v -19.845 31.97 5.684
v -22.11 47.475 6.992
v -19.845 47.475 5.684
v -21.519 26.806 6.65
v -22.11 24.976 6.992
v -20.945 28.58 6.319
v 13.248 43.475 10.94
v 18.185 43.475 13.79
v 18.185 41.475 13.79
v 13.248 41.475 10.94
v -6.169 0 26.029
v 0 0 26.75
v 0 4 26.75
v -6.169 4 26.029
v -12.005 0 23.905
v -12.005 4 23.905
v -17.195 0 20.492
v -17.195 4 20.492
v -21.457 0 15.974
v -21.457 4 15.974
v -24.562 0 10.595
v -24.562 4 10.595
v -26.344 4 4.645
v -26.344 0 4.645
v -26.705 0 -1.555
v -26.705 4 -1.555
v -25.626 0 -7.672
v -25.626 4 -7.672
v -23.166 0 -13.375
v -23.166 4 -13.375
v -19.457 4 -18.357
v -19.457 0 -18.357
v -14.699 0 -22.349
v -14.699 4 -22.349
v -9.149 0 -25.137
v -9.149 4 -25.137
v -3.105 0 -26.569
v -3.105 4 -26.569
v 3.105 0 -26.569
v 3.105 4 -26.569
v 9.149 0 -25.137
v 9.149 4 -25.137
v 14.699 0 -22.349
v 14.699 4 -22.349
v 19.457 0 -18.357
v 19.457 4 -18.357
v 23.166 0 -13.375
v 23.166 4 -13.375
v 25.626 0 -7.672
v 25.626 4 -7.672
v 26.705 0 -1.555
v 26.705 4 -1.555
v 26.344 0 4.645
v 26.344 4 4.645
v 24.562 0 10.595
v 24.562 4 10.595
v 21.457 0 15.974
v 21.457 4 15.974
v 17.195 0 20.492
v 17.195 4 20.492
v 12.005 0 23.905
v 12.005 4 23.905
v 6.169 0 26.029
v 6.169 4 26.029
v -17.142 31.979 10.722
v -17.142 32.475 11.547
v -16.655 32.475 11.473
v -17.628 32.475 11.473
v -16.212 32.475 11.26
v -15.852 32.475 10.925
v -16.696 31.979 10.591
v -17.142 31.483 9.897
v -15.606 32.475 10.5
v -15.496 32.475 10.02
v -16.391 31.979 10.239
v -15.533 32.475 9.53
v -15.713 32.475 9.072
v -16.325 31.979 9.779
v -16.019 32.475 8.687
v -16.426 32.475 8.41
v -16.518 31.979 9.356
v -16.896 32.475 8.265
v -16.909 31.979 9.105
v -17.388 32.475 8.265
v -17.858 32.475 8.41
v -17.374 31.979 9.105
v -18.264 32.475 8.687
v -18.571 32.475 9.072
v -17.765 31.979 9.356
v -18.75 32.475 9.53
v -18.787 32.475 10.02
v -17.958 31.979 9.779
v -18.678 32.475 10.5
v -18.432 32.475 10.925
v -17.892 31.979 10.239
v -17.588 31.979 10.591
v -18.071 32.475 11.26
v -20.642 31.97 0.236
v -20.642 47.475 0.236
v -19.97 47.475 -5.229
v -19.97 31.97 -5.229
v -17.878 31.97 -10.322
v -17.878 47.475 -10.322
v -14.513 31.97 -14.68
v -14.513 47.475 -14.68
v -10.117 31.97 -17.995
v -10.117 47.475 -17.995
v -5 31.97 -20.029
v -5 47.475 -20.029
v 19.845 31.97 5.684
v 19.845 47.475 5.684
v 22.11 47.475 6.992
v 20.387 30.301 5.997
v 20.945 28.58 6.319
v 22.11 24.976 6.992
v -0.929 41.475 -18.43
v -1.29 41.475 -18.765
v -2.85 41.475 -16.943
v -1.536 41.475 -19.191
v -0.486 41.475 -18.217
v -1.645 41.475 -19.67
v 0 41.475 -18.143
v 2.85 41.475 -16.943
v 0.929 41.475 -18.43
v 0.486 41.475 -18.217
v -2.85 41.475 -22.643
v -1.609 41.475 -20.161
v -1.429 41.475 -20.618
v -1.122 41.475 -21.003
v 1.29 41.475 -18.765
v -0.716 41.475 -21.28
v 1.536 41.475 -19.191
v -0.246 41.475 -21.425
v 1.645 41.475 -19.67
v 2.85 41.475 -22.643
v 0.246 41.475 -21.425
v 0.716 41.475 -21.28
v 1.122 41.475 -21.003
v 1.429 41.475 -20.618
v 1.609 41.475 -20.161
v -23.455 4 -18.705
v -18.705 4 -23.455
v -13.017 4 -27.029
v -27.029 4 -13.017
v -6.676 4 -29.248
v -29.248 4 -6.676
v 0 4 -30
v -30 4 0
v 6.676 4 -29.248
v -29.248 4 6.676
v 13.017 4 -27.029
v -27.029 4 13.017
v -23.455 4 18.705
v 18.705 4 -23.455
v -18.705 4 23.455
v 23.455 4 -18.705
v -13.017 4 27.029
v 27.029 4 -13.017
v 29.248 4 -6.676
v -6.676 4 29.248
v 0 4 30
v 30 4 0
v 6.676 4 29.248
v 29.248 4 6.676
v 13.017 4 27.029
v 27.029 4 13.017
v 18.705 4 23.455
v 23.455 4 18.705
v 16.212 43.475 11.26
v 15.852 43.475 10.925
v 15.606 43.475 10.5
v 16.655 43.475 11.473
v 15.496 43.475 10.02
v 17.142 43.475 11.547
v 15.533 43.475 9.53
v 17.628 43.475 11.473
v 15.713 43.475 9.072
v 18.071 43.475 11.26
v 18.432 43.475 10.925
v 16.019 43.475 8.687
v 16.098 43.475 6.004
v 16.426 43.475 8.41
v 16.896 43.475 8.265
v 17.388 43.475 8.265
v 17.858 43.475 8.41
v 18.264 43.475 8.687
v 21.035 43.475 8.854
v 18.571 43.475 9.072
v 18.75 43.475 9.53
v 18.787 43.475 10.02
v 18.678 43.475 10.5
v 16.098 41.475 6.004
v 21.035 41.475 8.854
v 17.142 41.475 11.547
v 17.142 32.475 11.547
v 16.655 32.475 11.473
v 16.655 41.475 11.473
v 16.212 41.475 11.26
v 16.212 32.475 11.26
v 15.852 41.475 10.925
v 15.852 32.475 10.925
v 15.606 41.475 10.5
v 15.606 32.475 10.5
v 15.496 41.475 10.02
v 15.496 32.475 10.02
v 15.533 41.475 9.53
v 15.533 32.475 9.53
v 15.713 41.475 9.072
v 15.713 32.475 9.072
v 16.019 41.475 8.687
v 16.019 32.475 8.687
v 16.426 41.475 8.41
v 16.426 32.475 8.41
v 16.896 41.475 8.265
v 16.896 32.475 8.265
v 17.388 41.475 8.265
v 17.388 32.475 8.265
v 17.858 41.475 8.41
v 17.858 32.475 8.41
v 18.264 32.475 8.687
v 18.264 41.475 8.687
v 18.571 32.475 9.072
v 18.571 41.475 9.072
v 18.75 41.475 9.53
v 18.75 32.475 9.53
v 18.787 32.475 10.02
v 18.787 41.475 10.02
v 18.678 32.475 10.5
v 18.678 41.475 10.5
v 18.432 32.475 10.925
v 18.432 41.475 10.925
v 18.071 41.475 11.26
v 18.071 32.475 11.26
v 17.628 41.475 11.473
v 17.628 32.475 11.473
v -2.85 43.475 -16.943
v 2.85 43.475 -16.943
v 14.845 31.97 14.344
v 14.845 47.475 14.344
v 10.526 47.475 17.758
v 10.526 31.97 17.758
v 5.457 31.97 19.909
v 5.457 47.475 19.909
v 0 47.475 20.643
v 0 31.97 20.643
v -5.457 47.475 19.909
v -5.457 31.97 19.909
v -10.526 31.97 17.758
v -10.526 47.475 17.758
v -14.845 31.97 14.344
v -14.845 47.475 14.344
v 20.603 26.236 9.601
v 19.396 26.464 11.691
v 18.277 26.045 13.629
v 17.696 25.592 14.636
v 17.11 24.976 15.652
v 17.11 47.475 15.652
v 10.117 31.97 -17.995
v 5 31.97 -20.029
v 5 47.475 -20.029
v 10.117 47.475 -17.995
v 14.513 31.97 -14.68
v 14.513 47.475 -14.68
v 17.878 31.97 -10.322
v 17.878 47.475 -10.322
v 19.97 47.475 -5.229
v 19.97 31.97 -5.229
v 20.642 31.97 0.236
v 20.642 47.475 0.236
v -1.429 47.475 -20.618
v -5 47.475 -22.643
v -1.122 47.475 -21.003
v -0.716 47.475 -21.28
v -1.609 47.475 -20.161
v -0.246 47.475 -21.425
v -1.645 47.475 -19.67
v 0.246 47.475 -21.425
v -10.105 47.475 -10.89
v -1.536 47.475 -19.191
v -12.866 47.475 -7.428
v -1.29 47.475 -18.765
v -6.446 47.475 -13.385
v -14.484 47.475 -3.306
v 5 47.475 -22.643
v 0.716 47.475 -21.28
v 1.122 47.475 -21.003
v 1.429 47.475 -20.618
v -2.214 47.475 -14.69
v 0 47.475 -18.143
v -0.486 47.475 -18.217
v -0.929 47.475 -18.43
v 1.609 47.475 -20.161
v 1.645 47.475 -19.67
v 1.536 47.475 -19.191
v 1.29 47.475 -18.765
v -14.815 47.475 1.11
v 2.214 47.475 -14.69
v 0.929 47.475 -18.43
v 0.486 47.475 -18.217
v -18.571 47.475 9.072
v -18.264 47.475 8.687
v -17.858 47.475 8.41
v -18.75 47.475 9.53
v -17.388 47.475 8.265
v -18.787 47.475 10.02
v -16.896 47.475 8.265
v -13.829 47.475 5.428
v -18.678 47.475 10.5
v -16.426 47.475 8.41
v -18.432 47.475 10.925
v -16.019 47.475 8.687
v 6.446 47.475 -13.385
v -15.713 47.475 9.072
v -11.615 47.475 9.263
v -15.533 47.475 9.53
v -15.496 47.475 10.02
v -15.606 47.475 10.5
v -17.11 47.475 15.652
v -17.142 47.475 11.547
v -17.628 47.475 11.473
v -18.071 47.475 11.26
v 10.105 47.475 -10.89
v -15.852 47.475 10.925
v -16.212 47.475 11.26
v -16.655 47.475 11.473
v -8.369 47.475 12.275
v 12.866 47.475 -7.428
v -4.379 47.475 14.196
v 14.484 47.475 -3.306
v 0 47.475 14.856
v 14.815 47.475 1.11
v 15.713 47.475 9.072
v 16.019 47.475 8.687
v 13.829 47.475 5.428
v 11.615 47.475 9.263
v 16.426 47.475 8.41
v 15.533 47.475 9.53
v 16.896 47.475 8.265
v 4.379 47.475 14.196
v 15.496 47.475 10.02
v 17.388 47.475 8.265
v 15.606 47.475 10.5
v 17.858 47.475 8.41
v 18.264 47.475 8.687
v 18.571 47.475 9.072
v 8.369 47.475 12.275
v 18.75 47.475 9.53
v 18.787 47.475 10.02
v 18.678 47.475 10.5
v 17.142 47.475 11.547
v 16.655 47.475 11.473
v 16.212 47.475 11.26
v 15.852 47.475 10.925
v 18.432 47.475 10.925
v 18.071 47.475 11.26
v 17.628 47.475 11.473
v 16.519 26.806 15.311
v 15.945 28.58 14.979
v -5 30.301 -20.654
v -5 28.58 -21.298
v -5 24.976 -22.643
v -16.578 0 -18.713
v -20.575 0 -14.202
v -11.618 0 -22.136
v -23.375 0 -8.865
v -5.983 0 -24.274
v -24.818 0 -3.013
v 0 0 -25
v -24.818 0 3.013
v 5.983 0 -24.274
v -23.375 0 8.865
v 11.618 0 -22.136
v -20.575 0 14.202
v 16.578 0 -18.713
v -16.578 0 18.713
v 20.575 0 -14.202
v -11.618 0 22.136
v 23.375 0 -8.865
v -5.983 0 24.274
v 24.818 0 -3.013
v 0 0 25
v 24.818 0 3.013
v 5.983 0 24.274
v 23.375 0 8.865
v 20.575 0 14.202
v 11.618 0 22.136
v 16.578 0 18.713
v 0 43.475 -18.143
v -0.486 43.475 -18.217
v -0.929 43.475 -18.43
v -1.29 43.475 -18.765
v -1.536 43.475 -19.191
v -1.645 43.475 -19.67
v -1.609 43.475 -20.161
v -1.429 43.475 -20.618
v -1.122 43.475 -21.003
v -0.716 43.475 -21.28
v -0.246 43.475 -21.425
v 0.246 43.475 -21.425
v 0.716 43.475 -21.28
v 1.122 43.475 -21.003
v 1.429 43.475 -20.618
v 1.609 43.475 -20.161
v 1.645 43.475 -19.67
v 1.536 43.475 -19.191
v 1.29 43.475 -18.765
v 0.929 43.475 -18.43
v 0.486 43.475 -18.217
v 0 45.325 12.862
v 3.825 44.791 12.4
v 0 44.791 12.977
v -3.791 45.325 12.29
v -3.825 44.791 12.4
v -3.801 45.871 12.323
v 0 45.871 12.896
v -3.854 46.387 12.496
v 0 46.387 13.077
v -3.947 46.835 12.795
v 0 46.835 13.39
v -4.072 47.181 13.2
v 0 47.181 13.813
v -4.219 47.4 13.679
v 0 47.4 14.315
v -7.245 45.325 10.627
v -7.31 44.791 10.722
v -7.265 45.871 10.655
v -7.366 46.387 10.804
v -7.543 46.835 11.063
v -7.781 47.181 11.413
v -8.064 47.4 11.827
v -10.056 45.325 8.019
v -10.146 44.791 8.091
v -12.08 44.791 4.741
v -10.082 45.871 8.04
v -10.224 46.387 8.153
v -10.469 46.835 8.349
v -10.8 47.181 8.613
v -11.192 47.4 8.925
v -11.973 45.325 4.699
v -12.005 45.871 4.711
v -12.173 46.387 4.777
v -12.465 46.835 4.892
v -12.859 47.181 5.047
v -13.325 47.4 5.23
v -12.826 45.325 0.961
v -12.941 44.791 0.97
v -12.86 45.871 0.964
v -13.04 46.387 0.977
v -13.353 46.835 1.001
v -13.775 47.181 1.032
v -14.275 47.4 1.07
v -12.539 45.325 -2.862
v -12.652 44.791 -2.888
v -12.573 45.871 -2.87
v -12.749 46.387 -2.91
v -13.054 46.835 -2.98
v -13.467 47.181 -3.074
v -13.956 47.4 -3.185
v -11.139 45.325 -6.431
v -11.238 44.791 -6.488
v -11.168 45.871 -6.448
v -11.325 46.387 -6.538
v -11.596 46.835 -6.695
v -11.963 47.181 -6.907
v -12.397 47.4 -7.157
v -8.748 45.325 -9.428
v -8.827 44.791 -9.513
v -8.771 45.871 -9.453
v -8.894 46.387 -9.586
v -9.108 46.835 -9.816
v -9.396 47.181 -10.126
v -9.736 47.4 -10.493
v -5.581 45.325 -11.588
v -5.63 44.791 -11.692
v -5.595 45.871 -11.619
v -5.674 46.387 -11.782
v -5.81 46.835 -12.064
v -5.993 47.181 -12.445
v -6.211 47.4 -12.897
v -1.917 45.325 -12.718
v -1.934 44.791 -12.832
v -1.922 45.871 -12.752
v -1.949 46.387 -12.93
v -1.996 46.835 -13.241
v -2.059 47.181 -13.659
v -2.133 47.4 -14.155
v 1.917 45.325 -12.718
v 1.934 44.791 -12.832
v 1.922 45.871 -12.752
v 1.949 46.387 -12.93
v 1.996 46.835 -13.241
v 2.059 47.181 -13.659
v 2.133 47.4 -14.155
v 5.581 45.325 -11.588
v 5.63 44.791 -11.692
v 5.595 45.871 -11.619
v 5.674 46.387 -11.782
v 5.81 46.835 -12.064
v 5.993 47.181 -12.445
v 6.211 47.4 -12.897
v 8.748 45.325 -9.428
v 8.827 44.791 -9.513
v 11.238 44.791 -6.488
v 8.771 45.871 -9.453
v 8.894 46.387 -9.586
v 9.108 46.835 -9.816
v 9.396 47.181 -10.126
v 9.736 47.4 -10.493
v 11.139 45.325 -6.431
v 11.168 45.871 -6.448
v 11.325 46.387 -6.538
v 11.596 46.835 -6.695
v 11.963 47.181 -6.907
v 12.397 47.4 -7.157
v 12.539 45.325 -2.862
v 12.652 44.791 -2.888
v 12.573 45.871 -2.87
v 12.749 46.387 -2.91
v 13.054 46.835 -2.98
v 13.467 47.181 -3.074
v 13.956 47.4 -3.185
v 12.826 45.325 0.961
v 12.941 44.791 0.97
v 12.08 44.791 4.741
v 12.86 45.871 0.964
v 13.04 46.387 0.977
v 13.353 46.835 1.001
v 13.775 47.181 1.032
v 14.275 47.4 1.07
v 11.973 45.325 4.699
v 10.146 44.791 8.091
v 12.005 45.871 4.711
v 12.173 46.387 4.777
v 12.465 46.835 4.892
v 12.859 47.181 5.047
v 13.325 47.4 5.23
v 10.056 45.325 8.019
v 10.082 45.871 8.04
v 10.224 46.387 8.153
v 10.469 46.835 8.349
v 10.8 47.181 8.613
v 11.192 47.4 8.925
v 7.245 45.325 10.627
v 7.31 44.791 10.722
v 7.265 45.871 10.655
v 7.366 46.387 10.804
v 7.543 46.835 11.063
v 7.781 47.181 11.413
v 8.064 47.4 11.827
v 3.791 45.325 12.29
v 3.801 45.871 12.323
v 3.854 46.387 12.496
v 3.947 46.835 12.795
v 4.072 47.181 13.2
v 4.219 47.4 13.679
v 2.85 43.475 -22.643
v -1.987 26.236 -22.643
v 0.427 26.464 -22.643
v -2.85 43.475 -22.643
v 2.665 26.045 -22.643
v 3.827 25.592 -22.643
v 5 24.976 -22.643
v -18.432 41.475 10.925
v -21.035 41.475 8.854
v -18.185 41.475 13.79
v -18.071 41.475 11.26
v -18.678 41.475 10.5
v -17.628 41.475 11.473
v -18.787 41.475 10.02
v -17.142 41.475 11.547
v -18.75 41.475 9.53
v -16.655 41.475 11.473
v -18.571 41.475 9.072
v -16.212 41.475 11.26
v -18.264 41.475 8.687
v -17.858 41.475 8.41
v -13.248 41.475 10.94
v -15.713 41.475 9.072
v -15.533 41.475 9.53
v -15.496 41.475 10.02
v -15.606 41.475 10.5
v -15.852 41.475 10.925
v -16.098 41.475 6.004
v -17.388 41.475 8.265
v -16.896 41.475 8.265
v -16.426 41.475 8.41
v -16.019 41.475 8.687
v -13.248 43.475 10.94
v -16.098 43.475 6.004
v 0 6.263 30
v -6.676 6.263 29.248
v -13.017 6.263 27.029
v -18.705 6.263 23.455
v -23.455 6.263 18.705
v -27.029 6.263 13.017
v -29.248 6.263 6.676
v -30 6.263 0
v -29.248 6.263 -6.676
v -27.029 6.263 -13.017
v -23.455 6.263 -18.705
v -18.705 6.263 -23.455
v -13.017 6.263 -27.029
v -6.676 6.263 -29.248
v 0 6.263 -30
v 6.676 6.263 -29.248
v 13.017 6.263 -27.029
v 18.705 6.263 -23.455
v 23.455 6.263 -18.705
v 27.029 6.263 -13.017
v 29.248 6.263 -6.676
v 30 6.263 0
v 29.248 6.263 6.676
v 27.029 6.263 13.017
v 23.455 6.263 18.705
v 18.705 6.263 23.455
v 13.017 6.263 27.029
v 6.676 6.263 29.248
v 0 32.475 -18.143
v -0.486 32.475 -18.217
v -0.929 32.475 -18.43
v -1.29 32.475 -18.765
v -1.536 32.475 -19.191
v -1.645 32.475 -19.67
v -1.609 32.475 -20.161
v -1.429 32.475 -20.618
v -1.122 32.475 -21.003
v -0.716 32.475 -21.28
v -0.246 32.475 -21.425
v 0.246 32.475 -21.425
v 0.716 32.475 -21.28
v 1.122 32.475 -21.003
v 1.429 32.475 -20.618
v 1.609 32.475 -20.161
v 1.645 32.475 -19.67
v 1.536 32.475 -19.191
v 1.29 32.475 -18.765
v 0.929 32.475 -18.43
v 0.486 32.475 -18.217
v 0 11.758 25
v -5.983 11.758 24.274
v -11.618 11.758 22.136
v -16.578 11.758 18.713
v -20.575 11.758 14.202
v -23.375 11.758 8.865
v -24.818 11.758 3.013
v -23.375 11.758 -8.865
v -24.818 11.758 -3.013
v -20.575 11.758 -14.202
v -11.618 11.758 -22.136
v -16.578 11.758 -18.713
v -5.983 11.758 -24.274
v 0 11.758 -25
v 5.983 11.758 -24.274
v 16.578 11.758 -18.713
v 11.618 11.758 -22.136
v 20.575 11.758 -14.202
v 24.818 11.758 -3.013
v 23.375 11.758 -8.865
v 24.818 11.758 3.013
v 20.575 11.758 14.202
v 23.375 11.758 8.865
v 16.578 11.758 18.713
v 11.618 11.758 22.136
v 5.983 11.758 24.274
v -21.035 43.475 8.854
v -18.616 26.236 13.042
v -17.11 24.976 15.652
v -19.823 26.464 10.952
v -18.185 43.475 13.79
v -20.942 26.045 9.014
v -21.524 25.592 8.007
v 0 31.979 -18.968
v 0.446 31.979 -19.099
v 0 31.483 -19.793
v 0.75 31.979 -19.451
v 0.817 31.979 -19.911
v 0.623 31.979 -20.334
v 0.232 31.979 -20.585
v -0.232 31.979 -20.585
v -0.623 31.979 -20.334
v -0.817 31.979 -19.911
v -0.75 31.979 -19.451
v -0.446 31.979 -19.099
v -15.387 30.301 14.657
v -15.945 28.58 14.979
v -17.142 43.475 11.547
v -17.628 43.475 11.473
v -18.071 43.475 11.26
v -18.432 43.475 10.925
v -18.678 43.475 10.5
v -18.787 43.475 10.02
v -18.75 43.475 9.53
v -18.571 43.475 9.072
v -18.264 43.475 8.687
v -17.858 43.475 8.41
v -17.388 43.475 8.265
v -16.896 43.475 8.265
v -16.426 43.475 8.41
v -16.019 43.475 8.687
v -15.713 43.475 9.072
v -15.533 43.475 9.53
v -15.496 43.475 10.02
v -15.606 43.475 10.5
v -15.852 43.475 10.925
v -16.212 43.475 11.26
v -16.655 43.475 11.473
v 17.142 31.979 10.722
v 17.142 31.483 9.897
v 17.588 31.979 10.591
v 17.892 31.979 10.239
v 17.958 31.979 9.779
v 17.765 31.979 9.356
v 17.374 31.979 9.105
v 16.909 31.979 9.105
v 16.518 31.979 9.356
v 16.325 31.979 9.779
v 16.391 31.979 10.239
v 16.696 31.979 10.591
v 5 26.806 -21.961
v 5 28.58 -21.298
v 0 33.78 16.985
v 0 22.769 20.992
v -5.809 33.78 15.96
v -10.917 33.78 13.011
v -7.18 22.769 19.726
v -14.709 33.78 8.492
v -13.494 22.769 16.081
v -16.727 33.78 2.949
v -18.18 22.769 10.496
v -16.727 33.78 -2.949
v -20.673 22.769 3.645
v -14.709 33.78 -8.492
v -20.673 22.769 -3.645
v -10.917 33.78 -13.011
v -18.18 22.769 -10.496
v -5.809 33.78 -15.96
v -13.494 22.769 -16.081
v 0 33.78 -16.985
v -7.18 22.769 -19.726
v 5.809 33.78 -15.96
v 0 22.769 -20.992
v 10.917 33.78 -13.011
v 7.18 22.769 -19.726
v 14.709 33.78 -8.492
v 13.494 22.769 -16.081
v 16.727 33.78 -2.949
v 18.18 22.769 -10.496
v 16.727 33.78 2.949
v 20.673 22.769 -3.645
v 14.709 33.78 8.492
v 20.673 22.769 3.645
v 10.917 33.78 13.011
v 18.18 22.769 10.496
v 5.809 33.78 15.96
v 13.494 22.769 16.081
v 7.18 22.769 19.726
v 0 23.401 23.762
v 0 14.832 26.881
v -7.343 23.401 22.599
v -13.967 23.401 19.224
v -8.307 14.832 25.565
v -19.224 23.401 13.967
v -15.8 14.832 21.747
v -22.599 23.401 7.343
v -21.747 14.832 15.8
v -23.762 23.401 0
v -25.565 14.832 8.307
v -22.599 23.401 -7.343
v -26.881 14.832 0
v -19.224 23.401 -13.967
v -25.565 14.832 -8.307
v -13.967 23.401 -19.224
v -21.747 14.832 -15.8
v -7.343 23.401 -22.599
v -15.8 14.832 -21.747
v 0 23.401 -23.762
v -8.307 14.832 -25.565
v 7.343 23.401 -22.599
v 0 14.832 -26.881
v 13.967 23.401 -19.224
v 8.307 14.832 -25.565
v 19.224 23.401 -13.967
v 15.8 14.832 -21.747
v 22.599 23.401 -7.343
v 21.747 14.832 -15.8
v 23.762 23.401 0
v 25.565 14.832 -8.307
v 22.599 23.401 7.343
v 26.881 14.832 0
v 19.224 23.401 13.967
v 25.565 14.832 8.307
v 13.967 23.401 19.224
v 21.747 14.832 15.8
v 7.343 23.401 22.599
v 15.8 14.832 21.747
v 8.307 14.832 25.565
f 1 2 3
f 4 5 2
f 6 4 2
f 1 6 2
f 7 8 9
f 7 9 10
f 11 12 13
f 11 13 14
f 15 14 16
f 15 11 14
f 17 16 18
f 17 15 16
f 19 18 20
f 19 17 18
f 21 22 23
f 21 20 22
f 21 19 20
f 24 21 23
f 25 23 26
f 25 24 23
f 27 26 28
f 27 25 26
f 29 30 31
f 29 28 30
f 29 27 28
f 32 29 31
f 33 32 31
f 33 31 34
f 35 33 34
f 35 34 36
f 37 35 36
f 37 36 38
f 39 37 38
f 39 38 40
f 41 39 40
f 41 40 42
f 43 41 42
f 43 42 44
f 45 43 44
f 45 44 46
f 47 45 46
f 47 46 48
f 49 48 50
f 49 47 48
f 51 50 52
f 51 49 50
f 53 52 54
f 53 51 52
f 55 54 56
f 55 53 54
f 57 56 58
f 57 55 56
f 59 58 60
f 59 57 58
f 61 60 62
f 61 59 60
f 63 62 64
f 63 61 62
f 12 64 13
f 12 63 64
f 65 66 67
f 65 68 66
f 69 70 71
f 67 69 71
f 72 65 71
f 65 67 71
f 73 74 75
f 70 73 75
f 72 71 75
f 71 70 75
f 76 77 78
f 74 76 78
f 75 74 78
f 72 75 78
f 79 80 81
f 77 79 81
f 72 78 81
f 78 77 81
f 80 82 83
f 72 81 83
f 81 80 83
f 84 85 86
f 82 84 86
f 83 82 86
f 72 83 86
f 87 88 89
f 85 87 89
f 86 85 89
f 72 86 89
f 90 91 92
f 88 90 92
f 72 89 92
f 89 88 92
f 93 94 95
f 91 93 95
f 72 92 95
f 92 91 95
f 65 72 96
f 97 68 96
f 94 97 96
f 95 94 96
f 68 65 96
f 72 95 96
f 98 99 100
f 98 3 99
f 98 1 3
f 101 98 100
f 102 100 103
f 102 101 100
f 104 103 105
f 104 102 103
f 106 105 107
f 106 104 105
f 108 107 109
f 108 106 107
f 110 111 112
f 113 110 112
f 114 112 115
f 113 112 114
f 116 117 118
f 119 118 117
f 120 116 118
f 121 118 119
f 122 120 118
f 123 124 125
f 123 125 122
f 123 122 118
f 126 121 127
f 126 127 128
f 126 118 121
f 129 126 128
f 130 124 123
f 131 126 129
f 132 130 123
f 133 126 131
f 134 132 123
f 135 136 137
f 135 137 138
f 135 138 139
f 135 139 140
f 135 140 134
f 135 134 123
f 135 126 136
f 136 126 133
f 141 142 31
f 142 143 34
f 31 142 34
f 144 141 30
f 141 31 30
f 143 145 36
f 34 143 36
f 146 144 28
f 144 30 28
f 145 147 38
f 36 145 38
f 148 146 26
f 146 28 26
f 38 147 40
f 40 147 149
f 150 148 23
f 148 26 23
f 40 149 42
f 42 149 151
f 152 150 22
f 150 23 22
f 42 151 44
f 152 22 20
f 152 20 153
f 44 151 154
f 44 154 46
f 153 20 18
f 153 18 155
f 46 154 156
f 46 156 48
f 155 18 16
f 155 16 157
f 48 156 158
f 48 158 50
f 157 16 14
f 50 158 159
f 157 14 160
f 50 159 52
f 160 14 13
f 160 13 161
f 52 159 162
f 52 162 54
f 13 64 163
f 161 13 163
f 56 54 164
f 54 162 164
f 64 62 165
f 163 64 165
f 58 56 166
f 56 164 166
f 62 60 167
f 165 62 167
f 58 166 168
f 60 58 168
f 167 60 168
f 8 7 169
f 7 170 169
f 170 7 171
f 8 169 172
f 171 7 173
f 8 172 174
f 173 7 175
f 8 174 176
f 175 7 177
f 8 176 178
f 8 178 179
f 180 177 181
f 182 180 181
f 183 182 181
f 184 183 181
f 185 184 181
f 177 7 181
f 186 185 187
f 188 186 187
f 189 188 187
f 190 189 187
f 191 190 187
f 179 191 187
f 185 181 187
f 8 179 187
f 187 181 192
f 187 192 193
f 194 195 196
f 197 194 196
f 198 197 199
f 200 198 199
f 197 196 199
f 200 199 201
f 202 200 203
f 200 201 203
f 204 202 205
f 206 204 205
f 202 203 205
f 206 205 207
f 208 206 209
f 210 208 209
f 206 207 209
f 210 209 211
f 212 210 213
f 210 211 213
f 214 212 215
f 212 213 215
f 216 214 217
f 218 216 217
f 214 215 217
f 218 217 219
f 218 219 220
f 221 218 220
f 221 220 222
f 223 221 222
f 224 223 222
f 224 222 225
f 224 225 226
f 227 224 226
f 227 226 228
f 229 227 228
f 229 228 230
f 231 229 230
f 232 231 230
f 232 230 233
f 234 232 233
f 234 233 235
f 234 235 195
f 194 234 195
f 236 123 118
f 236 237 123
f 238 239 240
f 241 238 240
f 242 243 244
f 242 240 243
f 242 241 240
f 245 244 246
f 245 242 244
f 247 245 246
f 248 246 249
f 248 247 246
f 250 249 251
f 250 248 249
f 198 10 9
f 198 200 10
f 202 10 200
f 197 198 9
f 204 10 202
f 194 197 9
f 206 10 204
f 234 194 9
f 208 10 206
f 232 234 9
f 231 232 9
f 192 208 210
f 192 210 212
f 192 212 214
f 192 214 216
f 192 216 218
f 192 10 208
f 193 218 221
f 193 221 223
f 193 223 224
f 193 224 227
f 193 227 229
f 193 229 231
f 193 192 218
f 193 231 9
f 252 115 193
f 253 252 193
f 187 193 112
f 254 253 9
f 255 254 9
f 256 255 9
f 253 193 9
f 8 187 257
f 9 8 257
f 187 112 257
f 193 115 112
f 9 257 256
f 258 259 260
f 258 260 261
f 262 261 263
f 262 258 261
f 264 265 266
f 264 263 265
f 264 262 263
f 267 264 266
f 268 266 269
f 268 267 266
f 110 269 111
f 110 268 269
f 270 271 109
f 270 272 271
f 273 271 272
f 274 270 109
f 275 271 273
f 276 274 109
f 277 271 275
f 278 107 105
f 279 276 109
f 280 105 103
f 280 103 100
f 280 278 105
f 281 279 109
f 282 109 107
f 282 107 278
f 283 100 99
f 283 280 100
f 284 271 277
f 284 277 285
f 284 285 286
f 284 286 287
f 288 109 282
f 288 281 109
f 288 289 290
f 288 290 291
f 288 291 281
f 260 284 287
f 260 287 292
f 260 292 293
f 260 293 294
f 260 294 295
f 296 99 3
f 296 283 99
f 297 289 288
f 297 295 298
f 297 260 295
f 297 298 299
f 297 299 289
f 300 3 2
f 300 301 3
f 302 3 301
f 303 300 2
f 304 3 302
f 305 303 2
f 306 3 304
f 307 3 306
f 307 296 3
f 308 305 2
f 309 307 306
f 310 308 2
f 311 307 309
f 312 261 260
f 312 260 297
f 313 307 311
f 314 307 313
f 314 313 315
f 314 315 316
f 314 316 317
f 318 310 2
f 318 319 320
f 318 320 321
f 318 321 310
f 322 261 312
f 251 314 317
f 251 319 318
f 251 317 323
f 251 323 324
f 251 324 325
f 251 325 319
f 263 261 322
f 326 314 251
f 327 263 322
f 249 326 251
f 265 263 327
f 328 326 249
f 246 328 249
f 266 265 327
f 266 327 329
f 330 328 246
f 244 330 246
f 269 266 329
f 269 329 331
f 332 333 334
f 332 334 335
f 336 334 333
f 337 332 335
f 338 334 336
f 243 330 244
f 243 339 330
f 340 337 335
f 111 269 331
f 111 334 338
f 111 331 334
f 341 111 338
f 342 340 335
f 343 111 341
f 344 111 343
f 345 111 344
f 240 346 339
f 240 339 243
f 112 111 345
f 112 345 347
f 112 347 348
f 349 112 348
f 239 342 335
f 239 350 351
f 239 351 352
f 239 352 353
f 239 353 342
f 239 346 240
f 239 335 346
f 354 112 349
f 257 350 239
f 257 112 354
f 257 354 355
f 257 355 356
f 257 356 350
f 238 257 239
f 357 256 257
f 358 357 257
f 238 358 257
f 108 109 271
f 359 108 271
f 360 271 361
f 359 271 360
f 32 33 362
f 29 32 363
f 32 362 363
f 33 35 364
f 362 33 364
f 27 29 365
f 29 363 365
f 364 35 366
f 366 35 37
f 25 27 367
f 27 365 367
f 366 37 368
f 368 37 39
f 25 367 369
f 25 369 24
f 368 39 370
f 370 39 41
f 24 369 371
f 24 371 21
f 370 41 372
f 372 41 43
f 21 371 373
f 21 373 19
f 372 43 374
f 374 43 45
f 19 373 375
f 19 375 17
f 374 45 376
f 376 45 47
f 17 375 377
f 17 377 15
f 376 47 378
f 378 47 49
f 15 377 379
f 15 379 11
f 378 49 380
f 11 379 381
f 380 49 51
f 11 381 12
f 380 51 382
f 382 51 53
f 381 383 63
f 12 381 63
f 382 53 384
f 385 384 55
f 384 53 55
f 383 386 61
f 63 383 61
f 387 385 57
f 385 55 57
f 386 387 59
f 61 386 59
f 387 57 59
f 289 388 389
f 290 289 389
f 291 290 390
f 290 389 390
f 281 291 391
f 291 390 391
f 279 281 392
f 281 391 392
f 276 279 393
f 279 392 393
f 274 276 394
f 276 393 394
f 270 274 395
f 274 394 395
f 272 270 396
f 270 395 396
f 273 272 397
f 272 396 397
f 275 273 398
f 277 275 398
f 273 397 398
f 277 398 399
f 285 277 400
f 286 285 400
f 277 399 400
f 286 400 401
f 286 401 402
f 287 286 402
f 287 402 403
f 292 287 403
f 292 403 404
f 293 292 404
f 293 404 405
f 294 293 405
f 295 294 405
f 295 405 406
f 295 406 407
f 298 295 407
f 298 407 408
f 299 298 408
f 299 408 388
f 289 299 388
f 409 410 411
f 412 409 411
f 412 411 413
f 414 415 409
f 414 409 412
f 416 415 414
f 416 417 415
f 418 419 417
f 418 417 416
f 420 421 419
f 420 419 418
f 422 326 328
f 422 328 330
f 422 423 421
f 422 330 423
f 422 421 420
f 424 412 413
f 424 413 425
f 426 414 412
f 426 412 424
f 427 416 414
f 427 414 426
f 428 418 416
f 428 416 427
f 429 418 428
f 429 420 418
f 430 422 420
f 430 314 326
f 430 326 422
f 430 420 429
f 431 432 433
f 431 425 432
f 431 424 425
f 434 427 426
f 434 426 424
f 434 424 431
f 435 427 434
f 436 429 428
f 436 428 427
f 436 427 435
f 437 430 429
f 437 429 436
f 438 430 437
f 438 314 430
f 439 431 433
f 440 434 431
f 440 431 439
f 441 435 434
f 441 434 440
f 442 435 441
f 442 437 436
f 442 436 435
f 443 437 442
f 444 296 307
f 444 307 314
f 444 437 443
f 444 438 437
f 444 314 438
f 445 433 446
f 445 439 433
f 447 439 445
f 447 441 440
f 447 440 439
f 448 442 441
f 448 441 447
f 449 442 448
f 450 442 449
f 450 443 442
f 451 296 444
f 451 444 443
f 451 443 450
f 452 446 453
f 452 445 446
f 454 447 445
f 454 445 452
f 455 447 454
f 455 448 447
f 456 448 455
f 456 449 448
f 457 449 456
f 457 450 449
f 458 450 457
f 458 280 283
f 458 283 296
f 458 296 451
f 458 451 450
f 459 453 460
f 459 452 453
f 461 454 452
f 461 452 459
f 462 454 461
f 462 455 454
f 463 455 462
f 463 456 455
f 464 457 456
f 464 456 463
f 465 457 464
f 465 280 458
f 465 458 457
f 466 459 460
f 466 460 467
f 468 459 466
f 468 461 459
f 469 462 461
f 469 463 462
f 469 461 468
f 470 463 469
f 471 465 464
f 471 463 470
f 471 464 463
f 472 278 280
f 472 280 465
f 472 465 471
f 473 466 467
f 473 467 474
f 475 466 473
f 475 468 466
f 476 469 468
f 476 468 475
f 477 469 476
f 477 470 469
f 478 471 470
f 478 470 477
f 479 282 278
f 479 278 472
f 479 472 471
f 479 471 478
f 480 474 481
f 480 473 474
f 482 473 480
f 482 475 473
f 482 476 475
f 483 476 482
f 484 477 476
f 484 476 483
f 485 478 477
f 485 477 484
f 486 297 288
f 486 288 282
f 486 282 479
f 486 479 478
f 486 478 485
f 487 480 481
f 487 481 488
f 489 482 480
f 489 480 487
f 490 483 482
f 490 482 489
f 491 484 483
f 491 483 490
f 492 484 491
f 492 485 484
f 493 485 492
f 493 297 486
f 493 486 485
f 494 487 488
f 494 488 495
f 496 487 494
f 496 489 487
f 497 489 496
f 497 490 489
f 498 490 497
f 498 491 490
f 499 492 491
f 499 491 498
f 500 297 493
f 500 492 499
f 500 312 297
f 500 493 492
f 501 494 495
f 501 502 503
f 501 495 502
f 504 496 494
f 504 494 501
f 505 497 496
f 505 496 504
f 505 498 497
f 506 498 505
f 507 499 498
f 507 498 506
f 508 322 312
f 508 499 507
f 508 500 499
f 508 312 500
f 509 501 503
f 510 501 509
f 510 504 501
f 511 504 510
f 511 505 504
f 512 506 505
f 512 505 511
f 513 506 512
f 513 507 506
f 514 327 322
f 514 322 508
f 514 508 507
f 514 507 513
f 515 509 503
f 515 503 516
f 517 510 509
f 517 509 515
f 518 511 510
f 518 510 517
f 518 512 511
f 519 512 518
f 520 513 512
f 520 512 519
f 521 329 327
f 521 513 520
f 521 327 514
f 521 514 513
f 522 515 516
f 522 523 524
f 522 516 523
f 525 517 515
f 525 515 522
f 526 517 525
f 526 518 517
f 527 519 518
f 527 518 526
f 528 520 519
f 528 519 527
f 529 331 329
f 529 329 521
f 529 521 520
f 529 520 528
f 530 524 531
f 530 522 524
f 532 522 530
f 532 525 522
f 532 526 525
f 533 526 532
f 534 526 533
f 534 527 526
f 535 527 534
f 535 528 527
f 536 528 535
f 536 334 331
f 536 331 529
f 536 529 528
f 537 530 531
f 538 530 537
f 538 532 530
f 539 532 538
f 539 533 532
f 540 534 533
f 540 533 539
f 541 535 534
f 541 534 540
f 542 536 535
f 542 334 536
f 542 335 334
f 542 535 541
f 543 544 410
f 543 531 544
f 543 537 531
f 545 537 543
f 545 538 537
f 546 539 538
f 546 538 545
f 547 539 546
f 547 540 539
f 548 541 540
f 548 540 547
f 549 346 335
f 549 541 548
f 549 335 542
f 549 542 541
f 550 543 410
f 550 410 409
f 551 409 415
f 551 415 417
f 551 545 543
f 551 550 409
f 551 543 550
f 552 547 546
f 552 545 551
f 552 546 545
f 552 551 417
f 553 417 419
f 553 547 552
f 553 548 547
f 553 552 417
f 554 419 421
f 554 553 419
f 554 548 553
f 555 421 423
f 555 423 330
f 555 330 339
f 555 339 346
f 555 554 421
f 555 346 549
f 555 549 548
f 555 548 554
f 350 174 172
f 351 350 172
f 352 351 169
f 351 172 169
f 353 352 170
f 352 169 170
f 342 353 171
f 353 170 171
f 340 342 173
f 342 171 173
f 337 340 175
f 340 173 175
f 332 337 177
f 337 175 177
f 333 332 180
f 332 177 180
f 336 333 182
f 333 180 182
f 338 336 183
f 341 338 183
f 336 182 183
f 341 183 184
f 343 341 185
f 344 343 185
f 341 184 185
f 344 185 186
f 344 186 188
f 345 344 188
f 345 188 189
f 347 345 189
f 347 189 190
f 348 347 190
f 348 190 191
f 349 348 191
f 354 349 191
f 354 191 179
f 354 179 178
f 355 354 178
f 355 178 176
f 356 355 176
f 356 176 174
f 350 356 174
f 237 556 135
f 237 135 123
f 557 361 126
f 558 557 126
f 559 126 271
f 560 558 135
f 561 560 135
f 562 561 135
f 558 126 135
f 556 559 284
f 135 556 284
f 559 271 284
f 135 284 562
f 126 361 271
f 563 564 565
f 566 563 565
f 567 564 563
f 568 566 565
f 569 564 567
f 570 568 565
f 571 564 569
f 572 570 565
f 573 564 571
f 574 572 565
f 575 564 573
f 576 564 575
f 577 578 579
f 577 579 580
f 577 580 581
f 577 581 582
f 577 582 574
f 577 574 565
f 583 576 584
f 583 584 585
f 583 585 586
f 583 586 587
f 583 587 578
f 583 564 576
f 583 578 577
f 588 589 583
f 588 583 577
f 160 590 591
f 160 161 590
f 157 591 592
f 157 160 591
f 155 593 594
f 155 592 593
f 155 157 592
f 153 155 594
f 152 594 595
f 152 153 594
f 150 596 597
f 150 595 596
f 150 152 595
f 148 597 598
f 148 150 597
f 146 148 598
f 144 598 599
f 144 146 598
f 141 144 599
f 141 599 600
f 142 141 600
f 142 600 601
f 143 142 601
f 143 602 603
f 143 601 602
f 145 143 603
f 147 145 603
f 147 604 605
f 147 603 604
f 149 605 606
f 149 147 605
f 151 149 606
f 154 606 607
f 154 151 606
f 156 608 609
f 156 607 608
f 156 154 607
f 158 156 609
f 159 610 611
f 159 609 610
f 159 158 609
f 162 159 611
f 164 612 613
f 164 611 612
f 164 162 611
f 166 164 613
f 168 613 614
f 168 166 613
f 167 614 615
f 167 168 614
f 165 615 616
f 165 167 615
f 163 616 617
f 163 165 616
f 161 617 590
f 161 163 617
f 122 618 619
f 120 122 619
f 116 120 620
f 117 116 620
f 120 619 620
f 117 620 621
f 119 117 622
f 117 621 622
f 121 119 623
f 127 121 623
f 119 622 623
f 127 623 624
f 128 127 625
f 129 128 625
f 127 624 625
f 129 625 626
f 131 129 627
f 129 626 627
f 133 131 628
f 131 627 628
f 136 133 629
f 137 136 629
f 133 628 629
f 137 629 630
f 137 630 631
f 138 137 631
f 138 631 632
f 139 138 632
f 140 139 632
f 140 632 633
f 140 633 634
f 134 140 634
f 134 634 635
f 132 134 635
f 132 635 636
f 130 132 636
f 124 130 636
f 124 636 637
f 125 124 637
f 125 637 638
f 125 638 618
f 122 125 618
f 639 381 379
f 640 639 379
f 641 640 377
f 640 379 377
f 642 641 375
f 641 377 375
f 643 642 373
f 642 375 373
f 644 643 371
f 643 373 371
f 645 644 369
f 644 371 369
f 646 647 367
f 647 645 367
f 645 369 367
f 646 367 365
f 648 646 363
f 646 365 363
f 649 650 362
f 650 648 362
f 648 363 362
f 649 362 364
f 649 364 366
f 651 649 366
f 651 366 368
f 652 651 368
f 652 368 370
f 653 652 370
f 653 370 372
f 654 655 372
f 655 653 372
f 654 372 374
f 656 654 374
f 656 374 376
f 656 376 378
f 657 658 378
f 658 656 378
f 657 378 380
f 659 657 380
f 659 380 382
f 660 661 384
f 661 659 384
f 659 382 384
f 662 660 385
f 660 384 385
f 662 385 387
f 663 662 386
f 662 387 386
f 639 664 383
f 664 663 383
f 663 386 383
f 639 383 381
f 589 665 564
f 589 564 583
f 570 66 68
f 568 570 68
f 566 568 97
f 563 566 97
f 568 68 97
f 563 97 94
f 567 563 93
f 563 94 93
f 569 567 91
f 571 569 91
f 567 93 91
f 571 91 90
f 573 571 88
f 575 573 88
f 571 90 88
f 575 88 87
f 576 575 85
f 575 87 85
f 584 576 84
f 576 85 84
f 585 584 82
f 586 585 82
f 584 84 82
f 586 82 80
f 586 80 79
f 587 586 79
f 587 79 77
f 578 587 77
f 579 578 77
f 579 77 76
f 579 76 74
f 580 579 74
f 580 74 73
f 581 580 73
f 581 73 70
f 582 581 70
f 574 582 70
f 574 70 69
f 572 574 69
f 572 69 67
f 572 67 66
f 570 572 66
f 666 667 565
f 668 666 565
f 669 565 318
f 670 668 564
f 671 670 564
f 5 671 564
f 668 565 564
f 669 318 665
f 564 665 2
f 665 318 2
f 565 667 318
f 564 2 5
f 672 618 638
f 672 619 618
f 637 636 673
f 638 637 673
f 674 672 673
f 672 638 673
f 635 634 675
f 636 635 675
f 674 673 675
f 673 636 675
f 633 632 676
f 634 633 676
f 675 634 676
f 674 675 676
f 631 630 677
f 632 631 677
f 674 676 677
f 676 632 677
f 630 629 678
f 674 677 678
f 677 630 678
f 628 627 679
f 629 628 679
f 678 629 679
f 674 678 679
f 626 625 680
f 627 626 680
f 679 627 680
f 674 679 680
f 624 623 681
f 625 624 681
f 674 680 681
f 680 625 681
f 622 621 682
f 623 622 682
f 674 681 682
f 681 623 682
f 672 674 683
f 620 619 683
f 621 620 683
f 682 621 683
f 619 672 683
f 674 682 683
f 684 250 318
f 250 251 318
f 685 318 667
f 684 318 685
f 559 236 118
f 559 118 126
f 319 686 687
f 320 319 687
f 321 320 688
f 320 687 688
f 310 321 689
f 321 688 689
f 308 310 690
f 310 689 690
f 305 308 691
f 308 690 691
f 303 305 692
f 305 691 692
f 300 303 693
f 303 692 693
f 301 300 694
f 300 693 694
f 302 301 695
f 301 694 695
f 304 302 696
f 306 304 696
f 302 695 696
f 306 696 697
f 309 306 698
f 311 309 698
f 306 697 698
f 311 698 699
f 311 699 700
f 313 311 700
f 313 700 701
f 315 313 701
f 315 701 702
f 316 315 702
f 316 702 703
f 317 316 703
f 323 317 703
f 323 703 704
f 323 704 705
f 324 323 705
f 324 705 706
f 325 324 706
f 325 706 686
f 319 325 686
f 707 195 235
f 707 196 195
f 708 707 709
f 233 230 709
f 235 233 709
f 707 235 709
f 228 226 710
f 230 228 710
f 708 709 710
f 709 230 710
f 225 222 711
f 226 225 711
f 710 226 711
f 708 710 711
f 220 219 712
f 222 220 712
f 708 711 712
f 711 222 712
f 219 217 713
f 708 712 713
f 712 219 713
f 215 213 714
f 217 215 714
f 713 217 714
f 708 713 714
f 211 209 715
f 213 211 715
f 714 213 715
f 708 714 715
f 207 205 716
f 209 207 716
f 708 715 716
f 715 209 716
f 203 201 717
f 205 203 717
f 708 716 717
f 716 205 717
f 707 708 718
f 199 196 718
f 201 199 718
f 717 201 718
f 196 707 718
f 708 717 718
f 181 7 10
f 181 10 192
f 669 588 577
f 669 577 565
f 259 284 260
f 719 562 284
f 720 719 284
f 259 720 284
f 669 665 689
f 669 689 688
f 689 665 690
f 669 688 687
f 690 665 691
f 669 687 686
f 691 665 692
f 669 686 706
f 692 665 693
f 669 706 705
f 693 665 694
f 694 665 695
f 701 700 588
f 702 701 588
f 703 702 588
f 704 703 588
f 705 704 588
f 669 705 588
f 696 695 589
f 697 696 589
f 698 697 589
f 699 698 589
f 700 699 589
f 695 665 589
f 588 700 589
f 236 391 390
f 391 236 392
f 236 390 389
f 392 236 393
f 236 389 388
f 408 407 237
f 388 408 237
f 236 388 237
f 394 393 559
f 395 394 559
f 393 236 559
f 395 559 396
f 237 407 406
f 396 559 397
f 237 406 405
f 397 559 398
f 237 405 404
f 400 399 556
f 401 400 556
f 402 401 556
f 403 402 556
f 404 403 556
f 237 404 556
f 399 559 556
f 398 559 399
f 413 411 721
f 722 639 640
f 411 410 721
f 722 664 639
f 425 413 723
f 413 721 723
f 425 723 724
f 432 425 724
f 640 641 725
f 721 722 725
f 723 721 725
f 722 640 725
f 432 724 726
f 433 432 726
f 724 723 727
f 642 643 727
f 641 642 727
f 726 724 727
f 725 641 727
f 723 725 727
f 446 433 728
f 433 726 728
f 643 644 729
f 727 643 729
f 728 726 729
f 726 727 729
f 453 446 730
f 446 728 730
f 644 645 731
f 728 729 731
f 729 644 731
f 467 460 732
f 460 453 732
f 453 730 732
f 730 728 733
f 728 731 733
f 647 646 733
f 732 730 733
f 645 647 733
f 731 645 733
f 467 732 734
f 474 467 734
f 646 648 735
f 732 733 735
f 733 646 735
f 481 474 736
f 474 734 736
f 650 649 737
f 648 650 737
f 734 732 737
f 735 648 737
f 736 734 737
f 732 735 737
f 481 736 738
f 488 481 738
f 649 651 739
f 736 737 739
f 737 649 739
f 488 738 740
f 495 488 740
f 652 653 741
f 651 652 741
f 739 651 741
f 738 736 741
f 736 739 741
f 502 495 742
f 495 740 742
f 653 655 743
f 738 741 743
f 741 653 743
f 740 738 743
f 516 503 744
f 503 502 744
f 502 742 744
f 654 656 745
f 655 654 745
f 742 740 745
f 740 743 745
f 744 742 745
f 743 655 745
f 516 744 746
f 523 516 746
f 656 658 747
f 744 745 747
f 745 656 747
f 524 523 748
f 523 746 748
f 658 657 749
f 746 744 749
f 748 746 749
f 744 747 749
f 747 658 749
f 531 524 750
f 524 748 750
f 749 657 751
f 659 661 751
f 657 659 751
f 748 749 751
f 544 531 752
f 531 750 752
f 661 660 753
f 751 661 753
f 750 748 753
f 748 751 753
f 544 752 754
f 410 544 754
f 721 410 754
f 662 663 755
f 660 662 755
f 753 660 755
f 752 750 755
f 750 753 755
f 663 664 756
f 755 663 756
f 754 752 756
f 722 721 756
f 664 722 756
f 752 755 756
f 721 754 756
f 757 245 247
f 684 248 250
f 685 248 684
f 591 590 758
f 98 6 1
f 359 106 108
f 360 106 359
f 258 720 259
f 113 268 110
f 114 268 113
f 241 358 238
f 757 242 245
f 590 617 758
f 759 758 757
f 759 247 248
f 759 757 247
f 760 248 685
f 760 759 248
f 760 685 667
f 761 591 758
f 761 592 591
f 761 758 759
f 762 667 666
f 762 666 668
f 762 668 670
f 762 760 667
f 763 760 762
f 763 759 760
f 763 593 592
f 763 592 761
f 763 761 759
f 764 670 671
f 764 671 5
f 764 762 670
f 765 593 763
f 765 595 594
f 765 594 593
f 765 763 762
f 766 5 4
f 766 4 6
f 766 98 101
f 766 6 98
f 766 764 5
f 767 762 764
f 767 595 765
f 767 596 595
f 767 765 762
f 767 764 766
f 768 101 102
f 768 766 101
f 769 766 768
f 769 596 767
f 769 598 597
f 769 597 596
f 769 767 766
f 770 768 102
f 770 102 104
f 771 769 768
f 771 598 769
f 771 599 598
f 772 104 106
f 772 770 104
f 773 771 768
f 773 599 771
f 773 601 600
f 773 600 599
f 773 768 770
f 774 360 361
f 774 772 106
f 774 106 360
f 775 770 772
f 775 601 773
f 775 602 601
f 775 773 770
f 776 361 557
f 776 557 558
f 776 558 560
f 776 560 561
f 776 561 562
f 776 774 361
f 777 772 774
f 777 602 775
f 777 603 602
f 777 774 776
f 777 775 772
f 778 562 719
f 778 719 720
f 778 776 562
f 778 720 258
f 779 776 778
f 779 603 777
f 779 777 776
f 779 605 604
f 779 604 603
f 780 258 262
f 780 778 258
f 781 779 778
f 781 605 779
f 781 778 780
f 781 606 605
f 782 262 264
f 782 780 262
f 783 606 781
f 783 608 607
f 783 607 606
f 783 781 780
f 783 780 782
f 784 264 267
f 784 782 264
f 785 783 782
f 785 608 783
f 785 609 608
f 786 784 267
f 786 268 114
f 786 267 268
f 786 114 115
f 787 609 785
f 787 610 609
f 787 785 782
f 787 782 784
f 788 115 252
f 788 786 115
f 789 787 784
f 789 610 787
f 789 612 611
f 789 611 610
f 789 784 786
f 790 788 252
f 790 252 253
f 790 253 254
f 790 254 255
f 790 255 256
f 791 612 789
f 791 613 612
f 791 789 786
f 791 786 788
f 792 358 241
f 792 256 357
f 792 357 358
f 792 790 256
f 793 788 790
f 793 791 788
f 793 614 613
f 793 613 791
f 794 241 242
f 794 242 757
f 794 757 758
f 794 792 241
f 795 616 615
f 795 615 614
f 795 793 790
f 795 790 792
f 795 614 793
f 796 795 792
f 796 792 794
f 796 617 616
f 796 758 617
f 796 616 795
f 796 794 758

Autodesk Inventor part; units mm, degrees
ref_plane "YZ Plane" through (0, 0, 0) normal (1, 0, 0) x (0, 1, 0)
ref_plane "XZ Plane" through (0, 0, 0) normal (0, 1, 0) x (-1, 0, 0)
ref_plane "XY Plane" through (0, 0, 0) normal (0, 0, 1) x (1, 0, 0)
sketch "Skizze2" plane through (0, 0, 0) normal (1, 0, 0) x (0, 1, 0)
  line L0 (47.4748, 12) -> (11.7576, 25)
  line L1 (0, 0) -> (48.6481, 0)
  line L2 (47.4748, 12) -> (47.4748, 20.6434)
  line L3 (47.4748, 20.6434) -> (31.9696, 20.6434)
  line L4 (6.2626, 30) -> (31.9696, 20.6434)
  line L5 (4, 30) -> (4, 26.75)
  line L6 (4, 26.75) -> (0, 26.75)
  line L7 (6.2626, 30) -> (4, 30)
  line L8 (11.7576, 25) -> (0, 25)
  line L9 (0, 25) -> (0, 26.75)
  line L10 (0, 0) -> (0, 25) construction
  dimension "d21" = 24
  dimension "d22" = 20
  dimension "d115" = 15.5052
  dimension "d164" = 60
  dimension "d166" = 53.5
  dimension "d167" = 50
  dimension "d168" = 4
  dimension "d169" = 3.25
  dimension "d170" = 8.6434
  dimension "d171" = 47.4748
revolve "Umdrehung1" add sketch "Skizze2" angle 360 about axis through (0, 0, 0) along (0, 1, 0)
sketch "Skizze15" plane through (0, 47.4748, 0) normal (0, 1, 0) x (1, 0, 0)
  circle A0 centre (0, 0) radius 20.6434 projected
  circle A1 centre (0, 0) radius 12 projected
  line L0 (-5, 18.6434) -> (-5, 22.6434)
  line L1 (-5, 22.6434) -> (5, 22.6434)
  line L2 (5, 22.6434) -> (5, 18.6434)
  line L3 (5, 18.6434) -> (-5, 18.6434)
  line L4 (-5, 18.6434) -> (5, 22.6434) construction
  line L5 (-5, 22.6434) -> (5, 18.6434) construction
  line L6 (-17.1098, -15.6518) -> (-22.1098, -6.9916)
  line L7 (-22.1098, -6.9916) -> (-18.6457, -4.9916)
  line L8 (-18.6457, -4.9916) -> (-13.6457, -13.6518)
  line L9 (-13.6457, -13.6518) -> (-17.1098, -15.6518)
  line L10 (22.1098, -6.9916) -> (17.1098, -15.6518)
  line L11 (17.1098, -15.6518) -> (13.6457, -13.6518)
  line L12 (13.6457, -13.6518) -> (18.6457, -4.9916)
  line L13 (18.6457, -4.9916) -> (22.1098, -6.9916)
  point P0 (0, 20.6434)
  dimension "d129" = 10
  dimension "d130" = 4
  dimension "d131" = 18.6434
  dimension "d134" = 360
extrude "Extrusion12" add sketch "Skizze15" against normal blind 25 contours L2 L3 L0 A0 | A0 L0 L1 L2 | L13 L10 L11 A0 | A0 L11 L12 L13 | L7 L8 L9 A0 | A0 L9 L6 L7
delete faces "Fläche löschen5" heal yes whole lump no faces at (0, 24.7239, -18.6434) (0.5603, 22.4748, -19.4397)
delete faces "Fläche löschen6" heal yes whole lump no faces at (17.1154, 22.4748, 9.2346) (16.1457, 24.7239, 9.3217)
delete faces "Fläche löschen7" heal yes whole lump no faces at (-16.5551, 22.4748, 10.2051) (-16.1457, 24.7239, 9.3217)
ref_plane "Arbeitsebene2" through (-5, 43.4748, -22.6434) normal (0, 1, 0) x (1, 0, 0)
sketch "Skizze16" plane through (-5, 43.4748, -22.6434) normal (0, 1, 0) x (1, 0, 0)
  line L0 (-17.1098, -29.635) -> (-12.1098, -38.2953) projected
  line L1 (0, 0) -> (10, 0) projected
  line L2 (2.15, 5.7) -> (7.85, 5.7)
  line L3 (7.85, 5.7) -> (7.85, -5.7)
  line L4 (7.85, -5.7) -> (2.15, -5.7)
  line L5 (2.15, -5.7) -> (2.15, 5.7)
  line L6 (2.15, 5.7) -> (7.85, -5.7) construction
  line L7 (7.85, 5.7) -> (2.15, -5.7) construction
  line L8 (-20.9711, -34.347) -> (-11.0984, -28.647)
  line L9 (-18.1211, -39.2833) -> (-20.9711, -34.347)
  line L10 (-8.2484, -33.5833) -> (-18.1211, -39.2833)
  line L11 (-11.0984, -28.647) -> (-8.2484, -33.5833)
  line L12 (28.1211, -39.2833) -> (18.2484, -33.5833)
  line L13 (30.9711, -34.347) -> (28.1211, -39.2833)
  line L14 (21.0984, -28.647) -> (30.9711, -34.347)
  line L15 (18.2484, -33.5833) -> (21.0984, -28.647)
  point P0 (5, -22.6434)
  point P1 (5, 0)
  dimension "d139" = 5.7
  dimension "d140" = 11.4
  dimension "d143" = 360
extrude "Extrusion13" cut sketch "Skizze16" against normal blind 2
sketch "Skizze17" plane through (-5, 47.4748, -22.6434) normal (0, 1, 0) x (1, 0, 0)
  line L0 (0, 0) -> (10, 0) projected
  line L1 (5, -22.6434) -> (5, -2.85) construction
  point P0 (-12.1416, -32.5402)
  point P1 (22.1416, -32.5402)
  dimension "d147" = 2.85
  dimension "d150" = 360
hole "Bohrung3" at (0, 47.4748, -19.7934) at (-17.1416, 47.4748, 9.8967) at (17.1416, 47.4748, 9.8967) direction (0, -1, 0) diameter 3.3 depth 15 tip angle 118
fillet "Rundung1" radius 2 1 edges at (0, 47.4748, -12)
properties part number "endkappen"
